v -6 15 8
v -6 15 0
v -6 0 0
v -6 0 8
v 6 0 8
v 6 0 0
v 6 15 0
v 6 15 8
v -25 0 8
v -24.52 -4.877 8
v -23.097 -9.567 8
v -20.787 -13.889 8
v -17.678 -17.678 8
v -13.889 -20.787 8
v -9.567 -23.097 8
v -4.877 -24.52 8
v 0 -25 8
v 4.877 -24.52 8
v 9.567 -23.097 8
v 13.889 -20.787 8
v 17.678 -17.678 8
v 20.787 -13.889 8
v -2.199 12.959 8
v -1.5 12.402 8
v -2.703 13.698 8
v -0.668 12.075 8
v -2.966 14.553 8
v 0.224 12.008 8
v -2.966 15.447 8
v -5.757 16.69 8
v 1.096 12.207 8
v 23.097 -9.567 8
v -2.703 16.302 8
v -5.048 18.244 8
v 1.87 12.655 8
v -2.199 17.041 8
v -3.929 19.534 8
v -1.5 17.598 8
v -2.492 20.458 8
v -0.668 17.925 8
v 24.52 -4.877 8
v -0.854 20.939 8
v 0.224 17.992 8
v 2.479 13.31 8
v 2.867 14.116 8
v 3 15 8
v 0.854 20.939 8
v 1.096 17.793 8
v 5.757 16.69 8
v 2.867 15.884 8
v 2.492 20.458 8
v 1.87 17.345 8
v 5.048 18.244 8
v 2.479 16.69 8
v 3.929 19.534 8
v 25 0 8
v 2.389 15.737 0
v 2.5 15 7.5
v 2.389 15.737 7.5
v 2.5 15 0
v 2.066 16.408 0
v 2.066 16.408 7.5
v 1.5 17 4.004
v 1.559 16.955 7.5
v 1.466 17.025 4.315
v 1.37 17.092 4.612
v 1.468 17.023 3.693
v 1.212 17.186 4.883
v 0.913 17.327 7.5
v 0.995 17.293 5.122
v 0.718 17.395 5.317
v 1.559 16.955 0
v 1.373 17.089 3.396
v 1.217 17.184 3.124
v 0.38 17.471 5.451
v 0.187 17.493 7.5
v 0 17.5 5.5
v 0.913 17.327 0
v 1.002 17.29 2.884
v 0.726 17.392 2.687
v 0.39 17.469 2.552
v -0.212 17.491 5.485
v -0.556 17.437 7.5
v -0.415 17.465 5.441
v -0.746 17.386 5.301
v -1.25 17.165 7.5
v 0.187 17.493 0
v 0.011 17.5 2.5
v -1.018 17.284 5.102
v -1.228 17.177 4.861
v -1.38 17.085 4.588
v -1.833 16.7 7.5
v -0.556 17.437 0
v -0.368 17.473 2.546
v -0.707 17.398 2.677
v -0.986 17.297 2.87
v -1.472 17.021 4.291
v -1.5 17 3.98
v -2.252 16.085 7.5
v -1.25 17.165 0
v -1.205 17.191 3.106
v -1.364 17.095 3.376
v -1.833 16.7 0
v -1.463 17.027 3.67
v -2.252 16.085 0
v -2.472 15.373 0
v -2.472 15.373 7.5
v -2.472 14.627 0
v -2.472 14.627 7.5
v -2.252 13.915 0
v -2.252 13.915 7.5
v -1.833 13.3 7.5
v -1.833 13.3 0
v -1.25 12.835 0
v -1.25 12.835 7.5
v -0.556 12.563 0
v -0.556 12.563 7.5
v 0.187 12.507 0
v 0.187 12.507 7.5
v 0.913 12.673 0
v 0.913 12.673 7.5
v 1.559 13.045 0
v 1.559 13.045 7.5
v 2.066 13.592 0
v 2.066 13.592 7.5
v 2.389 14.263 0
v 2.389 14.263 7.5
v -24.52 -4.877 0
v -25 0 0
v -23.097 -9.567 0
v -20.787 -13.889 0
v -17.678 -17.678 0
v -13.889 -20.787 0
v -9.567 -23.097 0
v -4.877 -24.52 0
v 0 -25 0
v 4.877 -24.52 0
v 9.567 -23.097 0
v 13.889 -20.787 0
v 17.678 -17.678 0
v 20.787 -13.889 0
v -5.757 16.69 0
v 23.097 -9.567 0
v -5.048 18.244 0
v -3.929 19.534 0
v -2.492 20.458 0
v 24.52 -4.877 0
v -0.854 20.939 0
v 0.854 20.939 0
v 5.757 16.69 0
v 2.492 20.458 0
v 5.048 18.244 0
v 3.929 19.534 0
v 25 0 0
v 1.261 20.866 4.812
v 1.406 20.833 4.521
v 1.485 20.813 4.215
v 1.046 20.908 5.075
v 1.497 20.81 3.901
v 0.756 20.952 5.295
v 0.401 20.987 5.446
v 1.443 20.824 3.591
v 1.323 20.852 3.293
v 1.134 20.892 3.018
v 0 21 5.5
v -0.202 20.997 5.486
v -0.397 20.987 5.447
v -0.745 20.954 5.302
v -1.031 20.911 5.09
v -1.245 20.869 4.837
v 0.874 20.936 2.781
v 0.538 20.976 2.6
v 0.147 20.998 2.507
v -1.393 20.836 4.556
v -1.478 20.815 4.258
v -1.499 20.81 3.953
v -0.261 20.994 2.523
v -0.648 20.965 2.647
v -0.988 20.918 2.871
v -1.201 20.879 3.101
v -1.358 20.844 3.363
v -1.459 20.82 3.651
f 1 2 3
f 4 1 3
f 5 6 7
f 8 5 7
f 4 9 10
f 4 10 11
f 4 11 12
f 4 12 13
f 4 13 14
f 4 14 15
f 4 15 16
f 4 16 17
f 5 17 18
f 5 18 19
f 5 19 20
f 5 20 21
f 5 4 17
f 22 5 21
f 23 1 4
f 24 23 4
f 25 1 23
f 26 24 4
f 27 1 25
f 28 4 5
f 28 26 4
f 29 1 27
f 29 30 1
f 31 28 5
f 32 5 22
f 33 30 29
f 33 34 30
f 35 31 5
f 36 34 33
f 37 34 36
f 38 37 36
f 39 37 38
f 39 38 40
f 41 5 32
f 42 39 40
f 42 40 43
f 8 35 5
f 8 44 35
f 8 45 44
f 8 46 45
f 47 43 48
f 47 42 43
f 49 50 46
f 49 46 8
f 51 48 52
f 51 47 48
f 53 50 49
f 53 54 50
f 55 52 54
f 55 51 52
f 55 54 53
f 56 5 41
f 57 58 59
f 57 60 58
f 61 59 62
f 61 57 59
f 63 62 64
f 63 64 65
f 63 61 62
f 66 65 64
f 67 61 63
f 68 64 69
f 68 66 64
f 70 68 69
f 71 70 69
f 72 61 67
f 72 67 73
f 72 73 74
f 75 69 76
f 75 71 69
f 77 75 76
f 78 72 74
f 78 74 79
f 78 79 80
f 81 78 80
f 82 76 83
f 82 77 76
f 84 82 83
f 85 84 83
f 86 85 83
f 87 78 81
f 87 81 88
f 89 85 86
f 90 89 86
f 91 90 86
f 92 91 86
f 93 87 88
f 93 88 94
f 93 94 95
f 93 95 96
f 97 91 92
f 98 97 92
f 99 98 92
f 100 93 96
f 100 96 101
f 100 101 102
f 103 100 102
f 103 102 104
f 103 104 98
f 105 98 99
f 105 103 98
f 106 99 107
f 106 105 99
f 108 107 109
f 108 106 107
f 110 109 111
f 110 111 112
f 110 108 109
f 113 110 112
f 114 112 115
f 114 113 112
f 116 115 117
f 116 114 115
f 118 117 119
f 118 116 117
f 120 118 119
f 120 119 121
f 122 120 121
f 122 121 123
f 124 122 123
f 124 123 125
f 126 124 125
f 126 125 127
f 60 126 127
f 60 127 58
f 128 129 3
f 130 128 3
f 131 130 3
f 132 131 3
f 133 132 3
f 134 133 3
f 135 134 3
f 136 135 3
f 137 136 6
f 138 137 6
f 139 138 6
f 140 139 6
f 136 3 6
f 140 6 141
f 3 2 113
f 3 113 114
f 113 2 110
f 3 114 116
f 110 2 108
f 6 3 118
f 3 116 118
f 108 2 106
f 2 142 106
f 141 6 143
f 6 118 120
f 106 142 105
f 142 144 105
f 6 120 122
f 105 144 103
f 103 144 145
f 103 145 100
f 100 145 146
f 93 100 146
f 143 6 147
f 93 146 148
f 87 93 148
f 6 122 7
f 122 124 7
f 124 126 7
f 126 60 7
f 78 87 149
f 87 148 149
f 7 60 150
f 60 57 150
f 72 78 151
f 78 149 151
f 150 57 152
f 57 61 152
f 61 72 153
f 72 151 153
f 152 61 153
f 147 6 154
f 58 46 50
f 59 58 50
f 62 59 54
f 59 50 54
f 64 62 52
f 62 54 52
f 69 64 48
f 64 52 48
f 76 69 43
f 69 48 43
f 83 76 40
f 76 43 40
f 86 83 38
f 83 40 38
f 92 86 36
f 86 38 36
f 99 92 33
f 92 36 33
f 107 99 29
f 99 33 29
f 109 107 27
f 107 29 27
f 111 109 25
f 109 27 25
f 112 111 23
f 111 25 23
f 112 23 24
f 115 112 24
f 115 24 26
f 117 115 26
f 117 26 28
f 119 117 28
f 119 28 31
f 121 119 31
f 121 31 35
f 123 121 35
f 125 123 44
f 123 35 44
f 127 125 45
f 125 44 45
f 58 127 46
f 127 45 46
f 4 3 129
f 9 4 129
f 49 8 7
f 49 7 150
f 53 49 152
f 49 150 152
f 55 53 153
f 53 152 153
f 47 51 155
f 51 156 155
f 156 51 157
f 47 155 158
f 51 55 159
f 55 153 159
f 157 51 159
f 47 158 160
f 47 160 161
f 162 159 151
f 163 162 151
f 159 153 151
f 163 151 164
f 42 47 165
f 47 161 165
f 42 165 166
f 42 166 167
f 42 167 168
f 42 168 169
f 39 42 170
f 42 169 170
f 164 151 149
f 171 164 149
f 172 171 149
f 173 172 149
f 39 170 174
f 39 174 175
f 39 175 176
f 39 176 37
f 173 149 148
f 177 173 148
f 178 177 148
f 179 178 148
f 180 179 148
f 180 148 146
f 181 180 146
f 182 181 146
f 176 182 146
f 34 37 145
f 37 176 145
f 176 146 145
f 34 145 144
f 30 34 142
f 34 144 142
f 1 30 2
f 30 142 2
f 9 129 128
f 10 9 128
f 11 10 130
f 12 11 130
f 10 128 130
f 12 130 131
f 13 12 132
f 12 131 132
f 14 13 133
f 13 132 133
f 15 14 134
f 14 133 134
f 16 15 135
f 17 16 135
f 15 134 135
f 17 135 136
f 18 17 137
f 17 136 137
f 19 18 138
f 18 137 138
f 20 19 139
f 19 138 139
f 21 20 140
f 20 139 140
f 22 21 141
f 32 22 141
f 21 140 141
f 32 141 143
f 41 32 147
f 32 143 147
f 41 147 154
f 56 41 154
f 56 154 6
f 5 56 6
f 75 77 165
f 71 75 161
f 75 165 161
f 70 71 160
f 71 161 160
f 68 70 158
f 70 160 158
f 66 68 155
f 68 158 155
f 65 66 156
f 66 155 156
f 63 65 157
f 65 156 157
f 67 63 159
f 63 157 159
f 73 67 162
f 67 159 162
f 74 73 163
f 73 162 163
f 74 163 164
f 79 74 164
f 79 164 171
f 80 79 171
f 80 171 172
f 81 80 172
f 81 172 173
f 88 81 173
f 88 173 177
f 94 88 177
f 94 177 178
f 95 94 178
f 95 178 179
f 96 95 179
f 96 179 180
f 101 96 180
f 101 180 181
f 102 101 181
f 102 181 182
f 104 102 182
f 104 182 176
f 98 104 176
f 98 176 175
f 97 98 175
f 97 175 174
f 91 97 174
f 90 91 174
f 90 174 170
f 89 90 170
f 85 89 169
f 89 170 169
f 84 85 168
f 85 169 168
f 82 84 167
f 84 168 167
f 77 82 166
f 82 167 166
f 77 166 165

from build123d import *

# Parameters (mm, degrees)
SKETCH1_R           = 2.5
BOSS_EXTRUDE1_DEPTH = 8
CHAMFER1_SIZE       = 0.5
SKETCH2_R           = 1.5
CUT_EXTRUDE1_DEPTH  = 5


with BuildPart() as part:
    # Sketch1 → Boss-Extrude1 (new body)
    with BuildSketch(Plane.XY):
        with BuildLine():
            Line((-6, 15), (-6, 0))
            Line((-6, 0), (-25, 0))
            ThreePointArc((-25, 0), (0, -25), (25, 0))
            Line((25, 0), (6, 0))
            Line((6, 0), (6, 15))
            ThreePointArc((6, 15), (0, 21), (-6, 15))
        make_face()
        with Locations((0, 15)):
            Circle(SKETCH1_R, mode=Mode.SUBTRACT)
    extrude(amount=BOSS_EXTRUDE1_DEPTH)

    # Chamfer1
    chamfer1_edges = [part.edges().sort_by_distance(p)[0] for p in [
        (-2.5, 15, 8),
    ]]
    chamfer(chamfer1_edges, length=CHAMFER1_SIZE)

    # Sketch2 → Cut-Extrude1 (cut)
    with BuildSketch(Plane(origin=(0, 21, 0), x_dir=(1, 0, 0), z_dir=(0, 1, 0))):
        with Locations(Location((0, -4, 0), (0, 0, 270))):
            Circle(SKETCH2_R)
    extrude(amount=-CUT_EXTRUDE1_DEPTH, mode=Mode.SUBTRACT)


solid = part.part
